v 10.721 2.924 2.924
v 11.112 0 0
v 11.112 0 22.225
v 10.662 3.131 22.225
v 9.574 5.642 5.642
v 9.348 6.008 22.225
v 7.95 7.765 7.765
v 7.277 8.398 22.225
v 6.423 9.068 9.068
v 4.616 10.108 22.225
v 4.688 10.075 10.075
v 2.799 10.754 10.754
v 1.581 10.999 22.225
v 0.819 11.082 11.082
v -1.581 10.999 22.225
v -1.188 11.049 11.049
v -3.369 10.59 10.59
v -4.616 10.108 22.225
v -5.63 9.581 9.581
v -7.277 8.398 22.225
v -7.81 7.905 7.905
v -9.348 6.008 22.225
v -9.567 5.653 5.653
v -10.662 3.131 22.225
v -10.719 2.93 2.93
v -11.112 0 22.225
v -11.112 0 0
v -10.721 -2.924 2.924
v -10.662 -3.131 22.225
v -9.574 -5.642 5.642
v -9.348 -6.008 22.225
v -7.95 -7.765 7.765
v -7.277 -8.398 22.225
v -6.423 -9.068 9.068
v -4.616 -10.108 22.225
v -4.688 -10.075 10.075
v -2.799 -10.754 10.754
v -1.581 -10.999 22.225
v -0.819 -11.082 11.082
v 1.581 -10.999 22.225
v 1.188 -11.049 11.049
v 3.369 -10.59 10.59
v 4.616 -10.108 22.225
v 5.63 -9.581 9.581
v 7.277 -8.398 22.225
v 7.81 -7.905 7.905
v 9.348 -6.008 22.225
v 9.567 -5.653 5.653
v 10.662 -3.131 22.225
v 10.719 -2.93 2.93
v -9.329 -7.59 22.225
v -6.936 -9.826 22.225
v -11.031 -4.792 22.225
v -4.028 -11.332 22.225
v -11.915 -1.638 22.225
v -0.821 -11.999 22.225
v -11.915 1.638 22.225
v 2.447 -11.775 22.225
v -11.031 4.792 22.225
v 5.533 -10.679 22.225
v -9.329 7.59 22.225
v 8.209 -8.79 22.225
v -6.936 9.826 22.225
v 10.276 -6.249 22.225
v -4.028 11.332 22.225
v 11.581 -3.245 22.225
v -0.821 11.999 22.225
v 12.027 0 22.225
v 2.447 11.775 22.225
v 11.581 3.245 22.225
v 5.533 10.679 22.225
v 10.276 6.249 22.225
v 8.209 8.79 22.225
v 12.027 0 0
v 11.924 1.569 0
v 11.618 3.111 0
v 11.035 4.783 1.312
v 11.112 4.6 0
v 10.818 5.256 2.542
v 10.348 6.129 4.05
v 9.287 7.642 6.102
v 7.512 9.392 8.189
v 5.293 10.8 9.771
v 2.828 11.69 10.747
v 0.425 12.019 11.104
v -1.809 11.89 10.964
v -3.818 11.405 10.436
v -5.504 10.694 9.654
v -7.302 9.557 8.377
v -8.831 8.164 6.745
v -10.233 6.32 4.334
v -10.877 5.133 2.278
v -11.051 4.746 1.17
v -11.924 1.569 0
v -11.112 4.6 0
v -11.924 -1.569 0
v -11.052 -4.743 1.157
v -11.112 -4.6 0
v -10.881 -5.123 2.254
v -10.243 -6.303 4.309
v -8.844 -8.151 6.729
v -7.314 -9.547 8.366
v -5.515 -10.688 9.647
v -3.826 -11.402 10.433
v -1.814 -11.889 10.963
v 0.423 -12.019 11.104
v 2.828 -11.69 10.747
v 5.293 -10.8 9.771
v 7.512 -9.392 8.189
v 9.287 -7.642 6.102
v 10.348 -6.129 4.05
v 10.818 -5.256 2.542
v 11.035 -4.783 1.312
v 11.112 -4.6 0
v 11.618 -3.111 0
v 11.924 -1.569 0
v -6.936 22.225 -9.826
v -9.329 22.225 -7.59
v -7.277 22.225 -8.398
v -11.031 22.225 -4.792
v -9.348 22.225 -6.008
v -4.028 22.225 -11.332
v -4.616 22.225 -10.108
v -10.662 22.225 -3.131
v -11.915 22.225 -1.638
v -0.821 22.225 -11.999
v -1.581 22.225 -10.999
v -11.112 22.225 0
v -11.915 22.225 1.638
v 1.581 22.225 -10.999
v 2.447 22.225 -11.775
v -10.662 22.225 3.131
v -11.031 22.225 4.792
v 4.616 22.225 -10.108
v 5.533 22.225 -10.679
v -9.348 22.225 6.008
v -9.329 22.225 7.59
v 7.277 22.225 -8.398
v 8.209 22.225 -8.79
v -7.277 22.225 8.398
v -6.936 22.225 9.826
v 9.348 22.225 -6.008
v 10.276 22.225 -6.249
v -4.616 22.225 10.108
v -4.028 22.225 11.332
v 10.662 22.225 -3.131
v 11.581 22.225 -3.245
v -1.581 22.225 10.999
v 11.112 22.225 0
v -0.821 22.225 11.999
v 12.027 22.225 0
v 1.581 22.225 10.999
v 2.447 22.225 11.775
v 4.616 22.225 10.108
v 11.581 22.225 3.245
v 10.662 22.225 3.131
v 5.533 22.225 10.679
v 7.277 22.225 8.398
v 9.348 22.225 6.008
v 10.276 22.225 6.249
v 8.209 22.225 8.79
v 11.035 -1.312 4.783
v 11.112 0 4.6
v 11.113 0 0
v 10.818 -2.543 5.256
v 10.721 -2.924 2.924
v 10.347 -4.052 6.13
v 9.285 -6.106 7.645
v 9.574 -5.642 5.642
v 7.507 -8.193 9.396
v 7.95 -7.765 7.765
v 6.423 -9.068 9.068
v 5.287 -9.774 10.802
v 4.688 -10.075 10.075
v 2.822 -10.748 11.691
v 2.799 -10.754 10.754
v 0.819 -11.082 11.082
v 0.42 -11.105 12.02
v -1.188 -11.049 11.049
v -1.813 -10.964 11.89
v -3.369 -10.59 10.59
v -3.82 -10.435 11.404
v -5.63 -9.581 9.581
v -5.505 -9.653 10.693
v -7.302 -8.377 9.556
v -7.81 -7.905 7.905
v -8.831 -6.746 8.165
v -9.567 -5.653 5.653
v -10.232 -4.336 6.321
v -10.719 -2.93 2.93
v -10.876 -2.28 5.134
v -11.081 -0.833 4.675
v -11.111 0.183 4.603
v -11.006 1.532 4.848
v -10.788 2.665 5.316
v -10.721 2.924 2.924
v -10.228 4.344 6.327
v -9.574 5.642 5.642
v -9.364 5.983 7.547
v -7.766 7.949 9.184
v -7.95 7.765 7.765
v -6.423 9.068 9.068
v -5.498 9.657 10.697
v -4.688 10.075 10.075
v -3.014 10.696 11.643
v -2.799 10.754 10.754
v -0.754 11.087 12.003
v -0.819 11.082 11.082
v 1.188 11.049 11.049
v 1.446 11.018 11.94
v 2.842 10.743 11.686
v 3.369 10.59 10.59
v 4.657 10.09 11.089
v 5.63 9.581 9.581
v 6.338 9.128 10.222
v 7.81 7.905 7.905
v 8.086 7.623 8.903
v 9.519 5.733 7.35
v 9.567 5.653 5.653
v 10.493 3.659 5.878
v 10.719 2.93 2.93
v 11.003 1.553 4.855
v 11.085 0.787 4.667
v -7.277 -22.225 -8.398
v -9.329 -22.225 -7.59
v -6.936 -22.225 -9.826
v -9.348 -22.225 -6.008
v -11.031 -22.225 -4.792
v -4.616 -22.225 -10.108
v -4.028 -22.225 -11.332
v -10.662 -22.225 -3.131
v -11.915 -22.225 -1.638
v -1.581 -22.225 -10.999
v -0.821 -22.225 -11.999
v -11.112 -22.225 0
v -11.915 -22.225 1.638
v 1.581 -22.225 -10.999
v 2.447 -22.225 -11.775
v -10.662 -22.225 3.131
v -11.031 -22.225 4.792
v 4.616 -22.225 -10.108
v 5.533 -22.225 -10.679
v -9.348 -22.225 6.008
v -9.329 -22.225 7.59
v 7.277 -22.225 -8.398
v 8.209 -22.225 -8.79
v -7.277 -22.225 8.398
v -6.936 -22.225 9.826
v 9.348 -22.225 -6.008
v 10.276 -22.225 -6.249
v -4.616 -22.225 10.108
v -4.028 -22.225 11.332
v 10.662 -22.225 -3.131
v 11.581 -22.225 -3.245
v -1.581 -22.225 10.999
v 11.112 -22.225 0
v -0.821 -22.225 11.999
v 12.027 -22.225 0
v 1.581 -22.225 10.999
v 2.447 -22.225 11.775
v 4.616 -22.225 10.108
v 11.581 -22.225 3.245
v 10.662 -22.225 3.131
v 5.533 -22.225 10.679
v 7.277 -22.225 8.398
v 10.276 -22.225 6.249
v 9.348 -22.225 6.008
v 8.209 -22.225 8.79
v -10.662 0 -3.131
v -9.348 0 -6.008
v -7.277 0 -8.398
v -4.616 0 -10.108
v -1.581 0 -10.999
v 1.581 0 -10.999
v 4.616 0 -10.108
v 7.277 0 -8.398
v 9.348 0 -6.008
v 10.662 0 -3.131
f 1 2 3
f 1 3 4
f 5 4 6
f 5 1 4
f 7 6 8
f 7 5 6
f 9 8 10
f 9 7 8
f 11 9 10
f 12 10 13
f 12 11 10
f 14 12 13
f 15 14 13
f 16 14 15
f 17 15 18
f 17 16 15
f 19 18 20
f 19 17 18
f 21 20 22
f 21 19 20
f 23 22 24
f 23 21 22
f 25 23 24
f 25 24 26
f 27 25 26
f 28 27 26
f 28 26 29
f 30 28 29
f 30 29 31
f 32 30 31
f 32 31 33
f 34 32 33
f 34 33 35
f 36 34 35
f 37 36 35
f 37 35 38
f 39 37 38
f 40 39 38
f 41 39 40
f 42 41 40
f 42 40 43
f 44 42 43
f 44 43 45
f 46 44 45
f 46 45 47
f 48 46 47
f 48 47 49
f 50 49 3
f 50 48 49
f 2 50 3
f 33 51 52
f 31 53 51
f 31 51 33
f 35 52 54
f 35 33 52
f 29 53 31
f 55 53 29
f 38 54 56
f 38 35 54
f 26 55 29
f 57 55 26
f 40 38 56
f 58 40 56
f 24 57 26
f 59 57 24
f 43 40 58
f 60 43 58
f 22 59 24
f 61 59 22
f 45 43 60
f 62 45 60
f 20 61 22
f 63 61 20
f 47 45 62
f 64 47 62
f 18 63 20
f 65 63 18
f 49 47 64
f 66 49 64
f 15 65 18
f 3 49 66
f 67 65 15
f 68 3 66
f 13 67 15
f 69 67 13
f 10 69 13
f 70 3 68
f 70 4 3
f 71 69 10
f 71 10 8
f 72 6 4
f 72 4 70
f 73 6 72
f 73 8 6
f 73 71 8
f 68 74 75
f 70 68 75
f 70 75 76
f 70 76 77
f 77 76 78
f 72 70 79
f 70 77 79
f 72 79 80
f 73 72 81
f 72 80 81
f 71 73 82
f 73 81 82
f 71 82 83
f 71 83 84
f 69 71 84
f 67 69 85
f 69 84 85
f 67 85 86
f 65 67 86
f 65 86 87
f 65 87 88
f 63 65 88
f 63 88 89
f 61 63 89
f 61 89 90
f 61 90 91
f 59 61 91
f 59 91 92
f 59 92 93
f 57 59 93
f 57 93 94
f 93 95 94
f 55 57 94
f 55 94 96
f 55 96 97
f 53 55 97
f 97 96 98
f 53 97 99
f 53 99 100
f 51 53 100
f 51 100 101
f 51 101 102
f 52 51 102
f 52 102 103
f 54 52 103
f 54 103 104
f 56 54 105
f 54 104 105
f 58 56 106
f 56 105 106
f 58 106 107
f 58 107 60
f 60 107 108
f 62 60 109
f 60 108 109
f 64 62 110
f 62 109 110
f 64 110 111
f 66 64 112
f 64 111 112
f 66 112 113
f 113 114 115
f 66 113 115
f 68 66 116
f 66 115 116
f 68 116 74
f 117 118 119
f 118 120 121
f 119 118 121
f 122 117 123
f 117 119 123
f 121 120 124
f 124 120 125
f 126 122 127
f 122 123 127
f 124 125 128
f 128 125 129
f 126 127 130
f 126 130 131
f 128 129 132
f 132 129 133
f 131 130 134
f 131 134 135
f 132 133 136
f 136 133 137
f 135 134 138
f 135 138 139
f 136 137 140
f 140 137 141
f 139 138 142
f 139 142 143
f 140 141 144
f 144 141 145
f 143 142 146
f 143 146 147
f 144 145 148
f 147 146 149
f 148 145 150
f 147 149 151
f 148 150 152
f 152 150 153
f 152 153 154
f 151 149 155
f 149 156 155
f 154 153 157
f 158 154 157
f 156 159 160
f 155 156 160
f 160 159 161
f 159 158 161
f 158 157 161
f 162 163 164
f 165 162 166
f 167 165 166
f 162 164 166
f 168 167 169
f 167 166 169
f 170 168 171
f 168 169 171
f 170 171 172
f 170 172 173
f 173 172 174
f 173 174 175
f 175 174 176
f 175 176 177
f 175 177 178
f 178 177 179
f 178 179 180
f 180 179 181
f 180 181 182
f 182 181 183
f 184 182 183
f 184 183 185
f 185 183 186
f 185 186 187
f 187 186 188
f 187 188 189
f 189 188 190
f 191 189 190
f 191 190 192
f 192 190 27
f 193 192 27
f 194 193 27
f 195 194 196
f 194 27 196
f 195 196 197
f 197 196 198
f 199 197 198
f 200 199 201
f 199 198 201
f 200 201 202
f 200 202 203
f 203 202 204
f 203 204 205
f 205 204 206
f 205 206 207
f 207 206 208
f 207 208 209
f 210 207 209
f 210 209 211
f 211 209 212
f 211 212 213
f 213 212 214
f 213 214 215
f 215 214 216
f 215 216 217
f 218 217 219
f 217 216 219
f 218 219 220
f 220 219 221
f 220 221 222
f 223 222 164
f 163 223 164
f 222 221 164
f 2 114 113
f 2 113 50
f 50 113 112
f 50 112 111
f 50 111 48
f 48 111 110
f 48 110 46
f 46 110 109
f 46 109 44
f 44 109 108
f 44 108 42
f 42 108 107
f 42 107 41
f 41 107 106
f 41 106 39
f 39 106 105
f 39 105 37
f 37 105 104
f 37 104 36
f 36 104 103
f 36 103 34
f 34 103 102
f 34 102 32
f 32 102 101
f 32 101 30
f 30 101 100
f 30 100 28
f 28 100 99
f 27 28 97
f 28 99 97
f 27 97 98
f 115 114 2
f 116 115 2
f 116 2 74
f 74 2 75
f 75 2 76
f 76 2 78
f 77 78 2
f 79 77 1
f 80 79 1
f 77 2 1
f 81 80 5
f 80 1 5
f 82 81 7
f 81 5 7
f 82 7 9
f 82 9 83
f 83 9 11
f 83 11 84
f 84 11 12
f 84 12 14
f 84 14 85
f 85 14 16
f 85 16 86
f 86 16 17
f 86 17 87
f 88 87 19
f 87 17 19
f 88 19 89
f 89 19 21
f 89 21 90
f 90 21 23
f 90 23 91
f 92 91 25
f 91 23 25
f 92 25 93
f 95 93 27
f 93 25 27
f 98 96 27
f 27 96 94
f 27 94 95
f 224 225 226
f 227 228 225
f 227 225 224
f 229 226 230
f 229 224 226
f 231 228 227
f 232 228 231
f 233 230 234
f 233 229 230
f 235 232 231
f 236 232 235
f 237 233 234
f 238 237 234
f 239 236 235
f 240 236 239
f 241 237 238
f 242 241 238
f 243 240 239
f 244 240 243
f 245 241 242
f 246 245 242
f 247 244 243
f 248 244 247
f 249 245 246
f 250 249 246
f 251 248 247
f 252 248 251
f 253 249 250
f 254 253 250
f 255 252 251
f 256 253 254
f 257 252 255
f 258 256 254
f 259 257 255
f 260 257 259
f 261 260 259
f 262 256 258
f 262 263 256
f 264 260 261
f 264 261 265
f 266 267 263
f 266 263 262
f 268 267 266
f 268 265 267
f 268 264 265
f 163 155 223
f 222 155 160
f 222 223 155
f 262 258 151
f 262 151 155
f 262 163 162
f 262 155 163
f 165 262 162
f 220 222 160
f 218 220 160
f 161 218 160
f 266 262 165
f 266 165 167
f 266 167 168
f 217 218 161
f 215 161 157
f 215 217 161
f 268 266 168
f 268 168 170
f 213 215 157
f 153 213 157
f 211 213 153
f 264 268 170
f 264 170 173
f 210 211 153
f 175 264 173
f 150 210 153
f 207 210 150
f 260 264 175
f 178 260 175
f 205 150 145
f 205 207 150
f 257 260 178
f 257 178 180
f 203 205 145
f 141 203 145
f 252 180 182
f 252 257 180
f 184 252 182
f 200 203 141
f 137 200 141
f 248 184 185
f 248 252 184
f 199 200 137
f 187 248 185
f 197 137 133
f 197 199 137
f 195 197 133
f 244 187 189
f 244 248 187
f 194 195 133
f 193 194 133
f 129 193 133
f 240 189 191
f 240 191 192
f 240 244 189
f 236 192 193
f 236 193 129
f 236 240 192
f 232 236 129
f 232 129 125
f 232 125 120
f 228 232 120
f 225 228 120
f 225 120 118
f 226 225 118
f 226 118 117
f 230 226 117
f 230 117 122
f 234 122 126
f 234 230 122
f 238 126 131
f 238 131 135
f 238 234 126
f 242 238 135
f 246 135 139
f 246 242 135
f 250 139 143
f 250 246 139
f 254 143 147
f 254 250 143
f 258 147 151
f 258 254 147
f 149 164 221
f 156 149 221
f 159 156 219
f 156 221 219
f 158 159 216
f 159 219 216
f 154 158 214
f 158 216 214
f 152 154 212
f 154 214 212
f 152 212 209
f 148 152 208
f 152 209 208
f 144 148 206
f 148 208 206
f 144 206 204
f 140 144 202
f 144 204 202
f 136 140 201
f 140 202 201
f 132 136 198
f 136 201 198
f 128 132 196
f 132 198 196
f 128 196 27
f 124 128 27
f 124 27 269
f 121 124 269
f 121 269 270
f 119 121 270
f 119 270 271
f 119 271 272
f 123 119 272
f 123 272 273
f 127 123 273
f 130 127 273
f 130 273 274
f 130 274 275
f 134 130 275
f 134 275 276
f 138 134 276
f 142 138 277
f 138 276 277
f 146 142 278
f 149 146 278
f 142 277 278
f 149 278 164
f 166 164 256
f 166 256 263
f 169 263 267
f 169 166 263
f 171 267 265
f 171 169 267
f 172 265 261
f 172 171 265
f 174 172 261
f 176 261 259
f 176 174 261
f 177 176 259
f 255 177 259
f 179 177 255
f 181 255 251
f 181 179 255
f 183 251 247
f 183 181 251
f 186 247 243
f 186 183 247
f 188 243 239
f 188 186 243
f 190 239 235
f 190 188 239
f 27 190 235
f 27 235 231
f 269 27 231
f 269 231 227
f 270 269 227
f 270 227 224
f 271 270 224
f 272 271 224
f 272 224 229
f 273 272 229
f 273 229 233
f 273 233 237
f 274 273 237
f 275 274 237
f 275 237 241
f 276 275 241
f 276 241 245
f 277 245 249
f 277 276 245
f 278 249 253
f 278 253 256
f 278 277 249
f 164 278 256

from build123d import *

# Parameters (mm, degrees)
F0_R          = 12.0269
F0_R_2        = 11.1125
F2_DEPTH      = 22.225
F2_DEPTH_BACK = 22.225
F1_R          = 12.0269
F1_R_2        = 11.1125
F3_DEPTH      = 22.225
F4_D          = 22.225
F4_DEPTH      = 12.0279
F5_D          = 22.225
F5_DEPTH      = 12.7
F5_TIP        = 6.6770636289
F6_D          = 22.225


with BuildPart() as f2:
    # F0 (on Front) → F2 (new body, two sides)
    with BuildSketch(Plane.XZ) as f2_sk:
        Circle(F0_R)
        Circle(F0_R_2, mode=Mode.SUBTRACT)
    extrude(amount=F2_DEPTH)
    extrude(f2_sk.sketch, amount=-F2_DEPTH_BACK)

    # F4 (through all, one way)
    with BuildSketch(Plane(origin=(0, 0, 0), x_dir=(1, 0, 0), z_dir=(0, 0, -1))):
        with Locations((0, 0)):
            Circle(F4_D / 2)
    extrude(amount=-F4_DEPTH, mode=Mode.SUBTRACT)


with BuildPart() as f3:
    # F1 (on Top) → F3 (new body)
    with BuildSketch(Plane.XY):
        Circle(F1_R)
        Circle(F1_R_2, mode=Mode.SUBTRACT)
    extrude(amount=F3_DEPTH)

    # F5 (one way)
    with BuildSketch(Plane.XZ):
        with Locations((0, 0)):
            Circle(F5_D / 2)
    extrude(amount=-F5_DEPTH, mode=Mode.SUBTRACT)
    with Locations(Plane.XZ):
        with Locations((0, 0)):
            with Locations((0, 0, -(F5_DEPTH + F5_TIP / 2))):  # 118° drill point
                Cone(0, F5_D / 2, F5_TIP, mode=Mode.SUBTRACT)

    # F6 (through all)
    with Locations(Plane(origin=(0, 0, 0), x_dir=(1, 0, 0), z_dir=(0, 1, 0))):
        with Locations((0, 0)):
            Hole(F6_D / 2)


solid = Compound([f2.part, f3.part])
